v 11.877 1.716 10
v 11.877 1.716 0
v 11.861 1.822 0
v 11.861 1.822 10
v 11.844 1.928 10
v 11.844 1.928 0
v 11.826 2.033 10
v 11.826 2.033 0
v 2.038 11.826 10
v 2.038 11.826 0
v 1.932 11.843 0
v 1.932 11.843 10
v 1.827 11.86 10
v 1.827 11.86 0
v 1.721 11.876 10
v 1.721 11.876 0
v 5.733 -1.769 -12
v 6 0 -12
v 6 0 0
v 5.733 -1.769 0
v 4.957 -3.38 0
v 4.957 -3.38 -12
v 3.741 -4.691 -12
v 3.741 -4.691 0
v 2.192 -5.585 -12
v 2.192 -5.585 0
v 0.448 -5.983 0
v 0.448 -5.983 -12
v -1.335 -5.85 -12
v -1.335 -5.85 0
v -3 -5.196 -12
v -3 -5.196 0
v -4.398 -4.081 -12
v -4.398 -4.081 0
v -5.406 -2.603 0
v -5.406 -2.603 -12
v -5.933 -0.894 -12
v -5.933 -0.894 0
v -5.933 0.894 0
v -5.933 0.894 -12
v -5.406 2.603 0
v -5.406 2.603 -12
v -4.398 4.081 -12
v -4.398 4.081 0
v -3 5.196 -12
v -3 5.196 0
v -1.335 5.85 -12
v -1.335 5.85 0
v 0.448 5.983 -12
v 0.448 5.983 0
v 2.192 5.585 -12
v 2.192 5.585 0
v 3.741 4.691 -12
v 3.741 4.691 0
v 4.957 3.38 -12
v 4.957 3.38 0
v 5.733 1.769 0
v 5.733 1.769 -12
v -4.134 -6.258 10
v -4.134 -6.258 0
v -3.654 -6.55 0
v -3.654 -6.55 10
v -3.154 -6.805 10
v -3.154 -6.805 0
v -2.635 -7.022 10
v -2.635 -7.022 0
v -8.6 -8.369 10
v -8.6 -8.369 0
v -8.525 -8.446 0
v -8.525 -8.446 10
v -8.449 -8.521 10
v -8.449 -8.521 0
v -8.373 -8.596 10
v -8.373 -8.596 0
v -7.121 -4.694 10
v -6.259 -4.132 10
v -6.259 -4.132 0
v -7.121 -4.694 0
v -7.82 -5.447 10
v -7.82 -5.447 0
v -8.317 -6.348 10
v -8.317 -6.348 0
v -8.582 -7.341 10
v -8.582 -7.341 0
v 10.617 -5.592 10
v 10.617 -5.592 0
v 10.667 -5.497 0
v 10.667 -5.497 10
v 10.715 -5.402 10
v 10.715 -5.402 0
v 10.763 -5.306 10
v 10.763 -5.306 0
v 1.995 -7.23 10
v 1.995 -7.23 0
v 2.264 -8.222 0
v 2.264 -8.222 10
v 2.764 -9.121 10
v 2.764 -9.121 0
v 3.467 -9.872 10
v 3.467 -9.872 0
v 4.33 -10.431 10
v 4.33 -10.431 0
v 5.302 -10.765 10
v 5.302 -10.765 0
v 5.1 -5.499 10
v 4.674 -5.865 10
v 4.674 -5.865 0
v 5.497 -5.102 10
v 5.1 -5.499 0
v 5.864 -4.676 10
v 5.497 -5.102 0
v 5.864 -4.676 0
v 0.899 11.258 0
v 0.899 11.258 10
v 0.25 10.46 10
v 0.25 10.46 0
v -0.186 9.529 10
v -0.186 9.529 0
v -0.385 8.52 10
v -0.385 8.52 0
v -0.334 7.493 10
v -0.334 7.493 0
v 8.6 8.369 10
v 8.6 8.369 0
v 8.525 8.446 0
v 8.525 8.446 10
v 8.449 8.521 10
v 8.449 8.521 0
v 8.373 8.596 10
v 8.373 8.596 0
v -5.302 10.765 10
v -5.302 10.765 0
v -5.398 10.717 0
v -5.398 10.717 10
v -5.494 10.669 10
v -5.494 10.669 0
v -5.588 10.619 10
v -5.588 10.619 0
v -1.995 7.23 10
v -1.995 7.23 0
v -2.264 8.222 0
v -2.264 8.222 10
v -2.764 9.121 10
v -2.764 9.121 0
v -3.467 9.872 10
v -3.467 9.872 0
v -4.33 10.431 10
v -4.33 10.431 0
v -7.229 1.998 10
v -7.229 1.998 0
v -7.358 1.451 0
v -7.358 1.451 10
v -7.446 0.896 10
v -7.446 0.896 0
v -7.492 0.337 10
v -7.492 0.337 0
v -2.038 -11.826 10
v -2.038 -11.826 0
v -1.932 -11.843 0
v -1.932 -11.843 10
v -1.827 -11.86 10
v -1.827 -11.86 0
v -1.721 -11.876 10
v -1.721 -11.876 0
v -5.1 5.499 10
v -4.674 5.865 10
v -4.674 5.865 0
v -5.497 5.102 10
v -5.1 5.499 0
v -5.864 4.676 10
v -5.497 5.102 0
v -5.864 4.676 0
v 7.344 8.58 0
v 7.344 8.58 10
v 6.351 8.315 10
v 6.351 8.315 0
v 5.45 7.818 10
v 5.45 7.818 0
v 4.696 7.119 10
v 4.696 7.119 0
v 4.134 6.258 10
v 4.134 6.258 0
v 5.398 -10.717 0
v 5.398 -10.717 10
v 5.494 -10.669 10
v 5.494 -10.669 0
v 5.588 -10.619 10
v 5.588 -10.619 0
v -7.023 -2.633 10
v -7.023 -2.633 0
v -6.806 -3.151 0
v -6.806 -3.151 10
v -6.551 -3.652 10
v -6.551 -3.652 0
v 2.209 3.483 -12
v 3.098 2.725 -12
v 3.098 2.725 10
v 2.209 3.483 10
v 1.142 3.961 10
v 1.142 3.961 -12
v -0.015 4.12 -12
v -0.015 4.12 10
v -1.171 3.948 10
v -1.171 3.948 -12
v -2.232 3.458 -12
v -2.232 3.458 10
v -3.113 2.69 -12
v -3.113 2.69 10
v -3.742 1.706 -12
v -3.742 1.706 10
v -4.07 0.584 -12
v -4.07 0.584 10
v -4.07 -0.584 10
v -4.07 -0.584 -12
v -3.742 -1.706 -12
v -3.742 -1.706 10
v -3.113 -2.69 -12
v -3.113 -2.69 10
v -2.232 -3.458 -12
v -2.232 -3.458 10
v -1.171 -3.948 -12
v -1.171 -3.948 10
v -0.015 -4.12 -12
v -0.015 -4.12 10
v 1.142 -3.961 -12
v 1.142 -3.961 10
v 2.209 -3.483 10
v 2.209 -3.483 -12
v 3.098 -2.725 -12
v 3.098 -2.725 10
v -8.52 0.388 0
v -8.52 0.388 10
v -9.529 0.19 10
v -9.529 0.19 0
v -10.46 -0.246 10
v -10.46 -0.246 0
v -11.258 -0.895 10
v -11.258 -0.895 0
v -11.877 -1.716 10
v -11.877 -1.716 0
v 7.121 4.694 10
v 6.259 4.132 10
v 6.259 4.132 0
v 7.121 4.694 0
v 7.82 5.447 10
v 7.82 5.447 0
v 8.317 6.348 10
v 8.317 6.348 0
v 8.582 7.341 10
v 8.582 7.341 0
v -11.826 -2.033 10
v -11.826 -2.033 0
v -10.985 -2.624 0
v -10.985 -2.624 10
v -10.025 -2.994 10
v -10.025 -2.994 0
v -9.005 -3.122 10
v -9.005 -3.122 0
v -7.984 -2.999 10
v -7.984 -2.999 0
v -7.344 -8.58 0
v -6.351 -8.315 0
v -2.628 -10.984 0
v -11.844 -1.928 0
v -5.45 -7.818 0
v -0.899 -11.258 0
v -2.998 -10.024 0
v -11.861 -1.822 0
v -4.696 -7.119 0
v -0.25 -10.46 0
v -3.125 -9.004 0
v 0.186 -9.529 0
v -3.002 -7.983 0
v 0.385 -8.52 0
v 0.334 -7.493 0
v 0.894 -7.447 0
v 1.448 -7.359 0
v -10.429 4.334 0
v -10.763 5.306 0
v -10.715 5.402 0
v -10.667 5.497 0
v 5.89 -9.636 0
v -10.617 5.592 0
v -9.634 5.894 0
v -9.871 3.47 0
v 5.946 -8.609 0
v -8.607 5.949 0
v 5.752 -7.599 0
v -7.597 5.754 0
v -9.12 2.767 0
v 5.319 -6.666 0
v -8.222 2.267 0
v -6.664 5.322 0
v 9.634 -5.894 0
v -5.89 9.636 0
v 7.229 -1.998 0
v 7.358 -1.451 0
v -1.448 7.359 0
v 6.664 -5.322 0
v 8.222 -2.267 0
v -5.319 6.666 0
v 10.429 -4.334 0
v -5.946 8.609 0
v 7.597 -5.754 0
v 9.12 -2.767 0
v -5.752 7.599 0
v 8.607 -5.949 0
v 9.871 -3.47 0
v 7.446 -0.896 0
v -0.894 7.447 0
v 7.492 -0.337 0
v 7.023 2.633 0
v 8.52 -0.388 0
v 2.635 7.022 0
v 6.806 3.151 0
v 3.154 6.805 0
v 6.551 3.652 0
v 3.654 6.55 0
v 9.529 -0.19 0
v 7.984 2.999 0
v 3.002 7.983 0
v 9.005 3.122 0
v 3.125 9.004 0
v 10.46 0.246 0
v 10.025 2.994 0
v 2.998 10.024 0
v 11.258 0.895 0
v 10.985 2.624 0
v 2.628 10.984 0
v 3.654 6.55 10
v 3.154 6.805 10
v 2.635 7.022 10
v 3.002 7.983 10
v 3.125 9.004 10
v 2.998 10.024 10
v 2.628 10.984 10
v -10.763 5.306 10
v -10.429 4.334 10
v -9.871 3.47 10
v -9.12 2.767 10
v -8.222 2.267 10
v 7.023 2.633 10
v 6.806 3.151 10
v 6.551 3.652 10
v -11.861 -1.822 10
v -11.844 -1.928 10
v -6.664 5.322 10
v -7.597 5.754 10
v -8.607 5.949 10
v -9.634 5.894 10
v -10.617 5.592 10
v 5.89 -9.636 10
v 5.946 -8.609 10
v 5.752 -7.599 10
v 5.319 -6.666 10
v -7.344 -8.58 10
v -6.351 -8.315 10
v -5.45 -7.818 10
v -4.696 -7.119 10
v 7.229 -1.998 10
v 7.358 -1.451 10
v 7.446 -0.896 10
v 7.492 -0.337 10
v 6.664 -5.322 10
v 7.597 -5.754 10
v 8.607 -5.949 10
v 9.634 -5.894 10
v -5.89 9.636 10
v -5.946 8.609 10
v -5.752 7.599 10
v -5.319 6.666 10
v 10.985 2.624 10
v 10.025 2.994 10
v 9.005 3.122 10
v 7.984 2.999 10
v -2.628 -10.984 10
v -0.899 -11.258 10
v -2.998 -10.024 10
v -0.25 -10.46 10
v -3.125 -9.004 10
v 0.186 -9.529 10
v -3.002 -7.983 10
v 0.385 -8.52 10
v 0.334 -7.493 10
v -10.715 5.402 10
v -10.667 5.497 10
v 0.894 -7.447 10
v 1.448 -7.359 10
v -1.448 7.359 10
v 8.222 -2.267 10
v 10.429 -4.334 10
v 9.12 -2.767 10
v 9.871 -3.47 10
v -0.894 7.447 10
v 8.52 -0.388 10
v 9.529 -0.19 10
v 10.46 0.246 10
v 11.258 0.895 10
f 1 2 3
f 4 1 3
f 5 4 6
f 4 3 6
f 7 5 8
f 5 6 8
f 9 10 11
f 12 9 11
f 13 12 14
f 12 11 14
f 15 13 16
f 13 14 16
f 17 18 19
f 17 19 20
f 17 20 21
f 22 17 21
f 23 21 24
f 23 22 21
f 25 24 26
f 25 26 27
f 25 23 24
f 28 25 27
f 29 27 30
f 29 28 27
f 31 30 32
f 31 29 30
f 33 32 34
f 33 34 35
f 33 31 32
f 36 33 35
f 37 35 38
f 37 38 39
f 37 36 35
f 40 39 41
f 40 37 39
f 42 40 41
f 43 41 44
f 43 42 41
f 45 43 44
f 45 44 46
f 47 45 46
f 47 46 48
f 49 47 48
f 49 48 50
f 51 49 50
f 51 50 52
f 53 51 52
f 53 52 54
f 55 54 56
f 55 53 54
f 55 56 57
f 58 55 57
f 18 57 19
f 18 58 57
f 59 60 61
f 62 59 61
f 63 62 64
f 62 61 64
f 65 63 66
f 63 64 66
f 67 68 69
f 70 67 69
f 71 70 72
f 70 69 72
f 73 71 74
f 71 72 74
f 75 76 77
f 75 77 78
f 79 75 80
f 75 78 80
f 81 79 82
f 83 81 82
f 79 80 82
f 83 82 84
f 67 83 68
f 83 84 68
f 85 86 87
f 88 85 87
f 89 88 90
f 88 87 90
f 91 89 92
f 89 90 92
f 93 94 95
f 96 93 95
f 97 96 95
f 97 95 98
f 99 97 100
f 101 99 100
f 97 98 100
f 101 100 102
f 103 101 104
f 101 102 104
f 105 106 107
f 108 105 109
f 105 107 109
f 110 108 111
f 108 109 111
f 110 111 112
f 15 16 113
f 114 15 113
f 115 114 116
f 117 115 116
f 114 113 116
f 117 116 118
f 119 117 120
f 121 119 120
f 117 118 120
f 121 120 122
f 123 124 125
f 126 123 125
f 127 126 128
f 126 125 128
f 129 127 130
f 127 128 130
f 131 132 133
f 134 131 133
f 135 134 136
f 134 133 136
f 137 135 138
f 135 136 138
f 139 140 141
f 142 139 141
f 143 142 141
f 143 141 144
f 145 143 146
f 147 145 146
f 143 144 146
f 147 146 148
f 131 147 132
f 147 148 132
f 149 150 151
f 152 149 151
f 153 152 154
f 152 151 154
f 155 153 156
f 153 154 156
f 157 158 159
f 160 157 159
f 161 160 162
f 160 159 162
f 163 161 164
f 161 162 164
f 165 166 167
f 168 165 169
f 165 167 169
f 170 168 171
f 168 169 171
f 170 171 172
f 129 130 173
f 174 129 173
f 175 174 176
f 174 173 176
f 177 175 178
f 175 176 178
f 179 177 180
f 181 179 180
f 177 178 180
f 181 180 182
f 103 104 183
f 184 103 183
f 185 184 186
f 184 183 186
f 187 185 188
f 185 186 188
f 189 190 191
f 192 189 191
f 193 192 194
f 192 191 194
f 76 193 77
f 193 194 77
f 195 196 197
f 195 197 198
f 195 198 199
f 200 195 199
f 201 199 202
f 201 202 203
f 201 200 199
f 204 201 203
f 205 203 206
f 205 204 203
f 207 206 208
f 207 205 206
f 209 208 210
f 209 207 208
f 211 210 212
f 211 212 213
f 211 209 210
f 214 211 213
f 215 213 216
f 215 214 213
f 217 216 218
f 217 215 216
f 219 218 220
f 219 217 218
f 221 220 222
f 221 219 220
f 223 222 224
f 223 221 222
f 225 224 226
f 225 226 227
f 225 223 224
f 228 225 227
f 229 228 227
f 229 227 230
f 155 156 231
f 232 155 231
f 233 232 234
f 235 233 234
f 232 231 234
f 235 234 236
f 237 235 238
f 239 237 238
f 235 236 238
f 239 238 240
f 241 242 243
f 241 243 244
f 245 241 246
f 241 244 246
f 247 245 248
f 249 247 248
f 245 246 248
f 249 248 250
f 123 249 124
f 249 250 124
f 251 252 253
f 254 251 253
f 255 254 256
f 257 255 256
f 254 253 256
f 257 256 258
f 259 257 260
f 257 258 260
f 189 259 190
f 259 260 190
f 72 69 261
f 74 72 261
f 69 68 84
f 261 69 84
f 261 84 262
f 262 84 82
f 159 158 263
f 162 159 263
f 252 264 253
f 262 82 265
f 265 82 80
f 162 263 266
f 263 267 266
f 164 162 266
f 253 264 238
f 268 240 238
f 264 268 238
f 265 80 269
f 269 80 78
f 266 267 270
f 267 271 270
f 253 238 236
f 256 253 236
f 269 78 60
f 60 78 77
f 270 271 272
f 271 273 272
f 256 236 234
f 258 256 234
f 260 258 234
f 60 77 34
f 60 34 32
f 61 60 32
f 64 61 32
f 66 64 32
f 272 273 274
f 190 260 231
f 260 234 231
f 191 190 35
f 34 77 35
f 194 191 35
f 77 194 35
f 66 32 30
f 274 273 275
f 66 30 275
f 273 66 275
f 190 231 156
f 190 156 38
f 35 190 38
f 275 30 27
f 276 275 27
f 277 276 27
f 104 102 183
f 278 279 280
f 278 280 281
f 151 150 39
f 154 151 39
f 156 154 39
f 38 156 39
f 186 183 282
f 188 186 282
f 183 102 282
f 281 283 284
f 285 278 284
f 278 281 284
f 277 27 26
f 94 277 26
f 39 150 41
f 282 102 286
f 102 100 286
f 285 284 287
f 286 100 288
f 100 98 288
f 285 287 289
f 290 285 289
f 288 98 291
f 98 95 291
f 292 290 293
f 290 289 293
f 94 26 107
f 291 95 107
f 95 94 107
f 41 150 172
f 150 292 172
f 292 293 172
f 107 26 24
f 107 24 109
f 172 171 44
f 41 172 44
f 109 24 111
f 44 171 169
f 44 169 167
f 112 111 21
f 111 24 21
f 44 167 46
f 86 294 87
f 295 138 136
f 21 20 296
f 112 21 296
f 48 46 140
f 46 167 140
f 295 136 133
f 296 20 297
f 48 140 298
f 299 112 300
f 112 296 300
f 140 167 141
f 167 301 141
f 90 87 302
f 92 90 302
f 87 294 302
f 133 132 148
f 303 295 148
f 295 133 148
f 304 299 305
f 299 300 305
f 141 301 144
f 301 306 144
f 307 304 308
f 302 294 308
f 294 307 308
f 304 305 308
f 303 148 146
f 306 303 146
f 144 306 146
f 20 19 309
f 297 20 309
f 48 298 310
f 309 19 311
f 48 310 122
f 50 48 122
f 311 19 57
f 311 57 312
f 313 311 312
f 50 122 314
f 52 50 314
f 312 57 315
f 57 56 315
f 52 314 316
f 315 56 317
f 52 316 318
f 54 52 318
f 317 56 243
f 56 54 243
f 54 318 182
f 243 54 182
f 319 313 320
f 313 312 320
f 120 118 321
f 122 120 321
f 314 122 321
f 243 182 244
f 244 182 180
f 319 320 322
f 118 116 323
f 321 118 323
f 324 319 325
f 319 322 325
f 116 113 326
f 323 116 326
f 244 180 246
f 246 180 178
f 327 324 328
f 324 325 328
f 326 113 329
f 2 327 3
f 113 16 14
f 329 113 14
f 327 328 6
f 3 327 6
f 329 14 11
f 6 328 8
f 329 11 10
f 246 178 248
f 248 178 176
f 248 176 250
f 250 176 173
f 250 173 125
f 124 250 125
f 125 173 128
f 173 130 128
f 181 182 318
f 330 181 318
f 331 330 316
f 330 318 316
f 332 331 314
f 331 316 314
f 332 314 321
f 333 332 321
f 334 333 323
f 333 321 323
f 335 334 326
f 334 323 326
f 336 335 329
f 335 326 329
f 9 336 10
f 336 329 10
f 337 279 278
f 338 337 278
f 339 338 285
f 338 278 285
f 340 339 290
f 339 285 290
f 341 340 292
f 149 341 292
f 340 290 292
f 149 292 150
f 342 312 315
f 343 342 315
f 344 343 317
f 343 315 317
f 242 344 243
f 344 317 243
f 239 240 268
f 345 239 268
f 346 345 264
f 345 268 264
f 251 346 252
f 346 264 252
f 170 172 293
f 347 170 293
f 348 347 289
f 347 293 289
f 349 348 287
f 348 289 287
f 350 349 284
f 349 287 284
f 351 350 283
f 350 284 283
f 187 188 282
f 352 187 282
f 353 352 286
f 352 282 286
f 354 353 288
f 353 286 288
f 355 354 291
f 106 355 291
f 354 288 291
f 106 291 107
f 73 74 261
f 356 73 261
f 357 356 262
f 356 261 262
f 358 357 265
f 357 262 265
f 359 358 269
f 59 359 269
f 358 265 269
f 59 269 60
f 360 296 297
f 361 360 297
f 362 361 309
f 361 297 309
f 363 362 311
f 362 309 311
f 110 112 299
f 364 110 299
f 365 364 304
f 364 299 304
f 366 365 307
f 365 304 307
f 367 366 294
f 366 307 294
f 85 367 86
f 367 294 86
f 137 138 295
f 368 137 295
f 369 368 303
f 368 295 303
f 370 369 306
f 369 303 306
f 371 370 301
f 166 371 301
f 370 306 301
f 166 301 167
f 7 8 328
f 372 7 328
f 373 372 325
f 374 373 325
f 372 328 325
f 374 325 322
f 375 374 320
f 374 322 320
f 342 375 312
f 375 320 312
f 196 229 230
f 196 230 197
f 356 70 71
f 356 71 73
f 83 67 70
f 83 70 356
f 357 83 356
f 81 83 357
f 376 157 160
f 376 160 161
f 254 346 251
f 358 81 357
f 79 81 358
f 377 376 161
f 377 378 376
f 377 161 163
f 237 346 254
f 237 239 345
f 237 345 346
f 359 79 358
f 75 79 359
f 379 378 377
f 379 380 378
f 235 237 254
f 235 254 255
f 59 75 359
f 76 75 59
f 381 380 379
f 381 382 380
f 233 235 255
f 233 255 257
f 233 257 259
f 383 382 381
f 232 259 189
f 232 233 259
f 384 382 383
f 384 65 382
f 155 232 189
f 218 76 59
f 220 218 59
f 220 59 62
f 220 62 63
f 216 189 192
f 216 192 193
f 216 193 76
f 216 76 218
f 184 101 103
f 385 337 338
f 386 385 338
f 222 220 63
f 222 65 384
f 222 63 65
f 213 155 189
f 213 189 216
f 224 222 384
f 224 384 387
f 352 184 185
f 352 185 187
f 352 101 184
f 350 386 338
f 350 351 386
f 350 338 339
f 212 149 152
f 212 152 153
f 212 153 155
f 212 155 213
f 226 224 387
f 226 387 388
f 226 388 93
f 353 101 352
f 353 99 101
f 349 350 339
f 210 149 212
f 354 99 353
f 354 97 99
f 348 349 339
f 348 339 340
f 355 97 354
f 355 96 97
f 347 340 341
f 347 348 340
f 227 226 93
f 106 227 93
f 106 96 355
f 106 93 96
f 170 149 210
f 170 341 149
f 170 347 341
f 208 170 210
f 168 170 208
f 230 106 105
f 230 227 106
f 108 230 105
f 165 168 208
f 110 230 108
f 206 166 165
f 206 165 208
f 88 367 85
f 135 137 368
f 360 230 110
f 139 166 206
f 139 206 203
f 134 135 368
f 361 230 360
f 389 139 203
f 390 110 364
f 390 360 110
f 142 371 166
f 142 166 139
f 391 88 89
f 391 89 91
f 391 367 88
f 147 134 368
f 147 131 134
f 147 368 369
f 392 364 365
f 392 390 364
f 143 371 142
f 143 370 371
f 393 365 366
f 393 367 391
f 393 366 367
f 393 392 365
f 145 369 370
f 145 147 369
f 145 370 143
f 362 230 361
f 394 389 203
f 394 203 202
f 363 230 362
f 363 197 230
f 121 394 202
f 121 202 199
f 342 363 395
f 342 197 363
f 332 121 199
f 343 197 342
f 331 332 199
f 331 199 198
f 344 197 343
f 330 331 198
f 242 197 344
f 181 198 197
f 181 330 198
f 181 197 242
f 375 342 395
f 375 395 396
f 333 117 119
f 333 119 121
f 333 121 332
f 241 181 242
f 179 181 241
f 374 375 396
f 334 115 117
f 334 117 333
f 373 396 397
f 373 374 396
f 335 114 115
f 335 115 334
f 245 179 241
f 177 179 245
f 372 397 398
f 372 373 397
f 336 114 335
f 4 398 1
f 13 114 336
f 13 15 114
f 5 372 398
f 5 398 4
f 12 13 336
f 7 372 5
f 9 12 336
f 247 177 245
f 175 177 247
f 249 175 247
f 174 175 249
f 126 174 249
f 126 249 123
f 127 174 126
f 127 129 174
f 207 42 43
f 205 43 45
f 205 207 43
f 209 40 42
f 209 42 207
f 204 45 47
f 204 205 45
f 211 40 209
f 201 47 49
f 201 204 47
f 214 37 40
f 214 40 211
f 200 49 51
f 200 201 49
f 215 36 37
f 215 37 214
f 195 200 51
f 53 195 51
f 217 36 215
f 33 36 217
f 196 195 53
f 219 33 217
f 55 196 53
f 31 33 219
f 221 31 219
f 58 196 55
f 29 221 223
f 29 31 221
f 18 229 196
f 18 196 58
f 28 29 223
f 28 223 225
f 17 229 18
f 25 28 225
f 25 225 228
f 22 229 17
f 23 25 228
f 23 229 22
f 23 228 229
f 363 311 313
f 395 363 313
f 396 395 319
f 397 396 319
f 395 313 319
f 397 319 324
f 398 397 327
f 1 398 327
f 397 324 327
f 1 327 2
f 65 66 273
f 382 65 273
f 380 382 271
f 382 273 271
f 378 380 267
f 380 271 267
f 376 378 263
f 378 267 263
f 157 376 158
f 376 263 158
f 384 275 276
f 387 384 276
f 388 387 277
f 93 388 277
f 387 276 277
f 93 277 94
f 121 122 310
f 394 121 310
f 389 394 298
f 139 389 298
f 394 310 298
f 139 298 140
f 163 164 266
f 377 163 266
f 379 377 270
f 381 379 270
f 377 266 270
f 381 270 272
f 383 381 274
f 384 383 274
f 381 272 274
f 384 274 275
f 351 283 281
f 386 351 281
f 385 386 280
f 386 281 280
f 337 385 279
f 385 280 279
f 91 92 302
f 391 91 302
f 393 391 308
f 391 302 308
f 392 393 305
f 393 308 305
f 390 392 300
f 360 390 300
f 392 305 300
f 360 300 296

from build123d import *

# Parameters (mm, degrees)
CROQUIS1_R              = 4
SALIENTE_EXTRUIR1_DEPTH = 10
SALIENTE_EXTRUIR2_START = -10
SALIENTE_EXTRUIR2_DEPTH = 10
SALIENTE_EXTRUIR3_START = 12
CROQUIS3_R              = 6
SALIENTE_EXTRUIR3_DEPTH = 12
CAVIDAD2_START          = -12
CAVIDAD2_DEPTH          = 22


# Read off the part's stored shape, not the designer's step: Cavidad2
with BuildPart() as part:
    # Croquis1 → Saliente-Extruir1 (new body)
    with BuildSketch(Plane.XY):
        with BuildLine():
            ThreePointArc((2.63548484, 7.021696352), (3.092608138, 9.517786714), (2.0376941, 11.82572631))
            ThreePointArc((2.0376941, 11.82572631), (1.879375062, 11.85191754), (1.720719944, 11.875989343))
            ThreePointArc((1.720719944, 11.875989343), (0.003562929, 10.007620913), (-0.333938693, 7.492561975))
            ThreePointArc((-0.333938693, 7.492561975), (-1.171907523, 7.4078764), (-1.995097537, 7.2297708))
            ThreePointArc((-1.995097537, 7.2297708), (-3.092442124, 9.517840655), (-5.302458366, 10.764940096))
            ThreePointArc((-5.302458366, 10.764940096), (-5.445935977, 10.693071651), (-5.588439715, 10.61929101))
            ThreePointArc((-5.588439715, 10.61929101), (-5.879449513, 8.098429629), (-4.674179509, 5.86532573))
            ThreePointArc((-4.674179509, 5.86532573), (-5.3023336, 5.304267941), (-5.863620467, 4.676318533))
            ThreePointArc((-5.863620467, 4.676318533), (-8.096284603, 5.882402966), (-10.617251961, 5.592312652))
            ThreePointArc((-10.617251961, 5.592312652), (-10.691084574, 5.449835835), (-10.763005347, 5.306384448))
            ThreePointArc((-10.763005347, 5.306384448), (-9.516712076, 3.095913482), (-7.229042621, 1.997734411))
            ThreePointArc((-7.229042621, 1.997734411), (-7.407448462, 1.174609414), (-7.492439675, 0.336671529))
            ThreePointArc((-7.492439675, 0.336671529), (-10.007621547, 8.7279e-05), (-11.876616173, -1.716388149))
            ThreePointArc((-11.876616173, -1.716388149), (-11.85260224, -1.875052036), (-11.826468757, -2.033380616))
            ThreePointArc((-11.826468757, -2.033380616), (-9.518914087, -3.089136389), (-7.022657159, -2.632923552))
            ThreePointArc((-7.022657159, -2.632923552), (-6.683169782, -3.403709986), (-6.259401586, -4.131572556))
            ThreePointArc((-6.259401586, -4.131572556), (-8.096387206, -5.882261746), (-8.599516679, -8.369487015))
            ThreePointArc((-8.599516679, -8.369487015), (-8.486828706, -8.483733761), (-8.37262307, -8.596463397))
            ThreePointArc((-8.37262307, -8.596463397), (-5.885214453, -8.094241155), (-4.133855353, -6.257894208))
            ThreePointArc((-4.133855353, -6.257894208), (-3.406147397, -6.681927859), (-2.63548484, -7.021696352))
            ThreePointArc((-2.63548484, -7.021696352), (-3.092608138, -9.517786714), (-2.0376941, -11.82572631))
            ThreePointArc((-2.0376941, -11.82572631), (-1.879375062, -11.85191754), (-1.720719944, -11.875989343))
            ThreePointArc((-1.720719944, -11.875989343), (-0.003562929, -10.007620913), (0.333938693, -7.492561975))
            ThreePointArc((0.333938693, -7.492561975), (1.171907523, -7.4078764), (1.995097537, -7.2297708))
            ThreePointArc((1.995097537, -7.2297708), (3.092442124, -9.517840655), (5.302458366, -10.764940096))
            ThreePointArc((5.302458366, -10.764940096), (5.445935977, -10.693071651), (5.588439715, -10.61929101))
            ThreePointArc((5.588439715, -10.61929101), (5.879449513, -8.098429629), (4.674179509, -5.86532573))
            ThreePointArc((4.674179509, -5.86532573), (5.3023336, -5.304267941), (5.863620467, -4.676318533))
            ThreePointArc((5.863620467, -4.676318533), (8.096284603, -5.882402966), (10.617251961, -5.592312652))
            ThreePointArc((10.617251961, -5.592312652), (10.691084574, -5.449835835), (10.763005347, -5.306384448))
            ThreePointArc((10.763005347, -5.306384448), (9.516712076, -3.095913482), (7.229042621, -1.997734411))
            ThreePointArc((7.229042621, -1.997734411), (7.407448462, -1.174609414), (7.492439675, -0.336671529))
            ThreePointArc((7.492439675, -0.336671529), (10.007621547, -8.7279e-05), (11.876616173, 1.716388149))
            ThreePointArc((11.876616173, 1.716388149), (11.85260224, 1.875052036), (11.826468757, 2.033380616))
            ThreePointArc((11.826468757, 2.033380616), (9.518914087, 3.089136389), (7.022657159, 2.632923552))
            ThreePointArc((7.022657159, 2.632923552), (6.683169782, 3.403709986), (6.259401586, 4.131572556))
            ThreePointArc((6.259401586, 4.131572556), (8.096387206, 5.882261746), (8.599516679, 8.369487015))
            ThreePointArc((8.599516679, 8.369487015), (8.486828706, 8.483733761), (8.37262307, 8.596463397))
            ThreePointArc((8.37262307, 8.596463397), (5.885214453, 8.094241155), (4.133855353, 6.257894208))
            ThreePointArc((4.133855353, 6.257894208), (3.406147397, 6.681927859), (2.63548484, 7.021696352))
        make_face()
        Circle(CROQUIS1_R, mode=Mode.SUBTRACT)
    extrude(amount=SALIENTE_EXTRUIR1_DEPTH)

    # Croquis2 → Saliente-Extruir2 (add)
    with BuildSketch(Plane.XY.offset(10).offset(SALIENTE_EXTRUIR2_START)):
        with BuildLine():
            Line((3, 2.645751311), (3, -2.645751311))
            ThreePointArc((3, -2.645751311), (4, 0), (3, 2.645751311))
        make_face()
    extrude(amount=SALIENTE_EXTRUIR2_DEPTH)

    # Croquis3 → Saliente-Extruir3 (add)
    with BuildSketch(Plane(origin=(0, 0, 0), x_dir=(-1, 0, 0), z_dir=(0, 0, -1)).offset(SALIENTE_EXTRUIR3_START)):
        with Locations(Location((0, 0, 0), (0, 0, 180))):
            Circle(CROQUIS3_R)
        with BuildLine():
            Line((-3, -2.645751311), (-3, 2.645751311))
            ThreePointArc((-3, 2.645751311), (4, 0), (-3, -2.645751311))
        make_face(mode=Mode.SUBTRACT)
    extrude(amount=-SALIENTE_EXTRUIR3_DEPTH)

    # Cavidad2 outline → Cavidad2 (cut)
    with BuildSketch(Plane.XY.offset(CAVIDAD2_START)):
        with BuildLine():
            ThreePointArc((3.097941964, 2.72512385), (-4.112058036, 0), (3.097941964, -2.72512385))
            Line((3.097941964, -2.72512385), (3.097941964, 2.72512385))
        make_face()
        with BuildLine():
            Line((3, 2.645751311), (3, -2.645751311))
            ThreePointArc((3, -2.645751311), (-4, 0), (3, 2.645751311))
        make_face(mode=Mode.SUBTRACT)
    extrude(amount=CAVIDAD2_DEPTH, mode=Mode.SUBTRACT)


solid = part.part
